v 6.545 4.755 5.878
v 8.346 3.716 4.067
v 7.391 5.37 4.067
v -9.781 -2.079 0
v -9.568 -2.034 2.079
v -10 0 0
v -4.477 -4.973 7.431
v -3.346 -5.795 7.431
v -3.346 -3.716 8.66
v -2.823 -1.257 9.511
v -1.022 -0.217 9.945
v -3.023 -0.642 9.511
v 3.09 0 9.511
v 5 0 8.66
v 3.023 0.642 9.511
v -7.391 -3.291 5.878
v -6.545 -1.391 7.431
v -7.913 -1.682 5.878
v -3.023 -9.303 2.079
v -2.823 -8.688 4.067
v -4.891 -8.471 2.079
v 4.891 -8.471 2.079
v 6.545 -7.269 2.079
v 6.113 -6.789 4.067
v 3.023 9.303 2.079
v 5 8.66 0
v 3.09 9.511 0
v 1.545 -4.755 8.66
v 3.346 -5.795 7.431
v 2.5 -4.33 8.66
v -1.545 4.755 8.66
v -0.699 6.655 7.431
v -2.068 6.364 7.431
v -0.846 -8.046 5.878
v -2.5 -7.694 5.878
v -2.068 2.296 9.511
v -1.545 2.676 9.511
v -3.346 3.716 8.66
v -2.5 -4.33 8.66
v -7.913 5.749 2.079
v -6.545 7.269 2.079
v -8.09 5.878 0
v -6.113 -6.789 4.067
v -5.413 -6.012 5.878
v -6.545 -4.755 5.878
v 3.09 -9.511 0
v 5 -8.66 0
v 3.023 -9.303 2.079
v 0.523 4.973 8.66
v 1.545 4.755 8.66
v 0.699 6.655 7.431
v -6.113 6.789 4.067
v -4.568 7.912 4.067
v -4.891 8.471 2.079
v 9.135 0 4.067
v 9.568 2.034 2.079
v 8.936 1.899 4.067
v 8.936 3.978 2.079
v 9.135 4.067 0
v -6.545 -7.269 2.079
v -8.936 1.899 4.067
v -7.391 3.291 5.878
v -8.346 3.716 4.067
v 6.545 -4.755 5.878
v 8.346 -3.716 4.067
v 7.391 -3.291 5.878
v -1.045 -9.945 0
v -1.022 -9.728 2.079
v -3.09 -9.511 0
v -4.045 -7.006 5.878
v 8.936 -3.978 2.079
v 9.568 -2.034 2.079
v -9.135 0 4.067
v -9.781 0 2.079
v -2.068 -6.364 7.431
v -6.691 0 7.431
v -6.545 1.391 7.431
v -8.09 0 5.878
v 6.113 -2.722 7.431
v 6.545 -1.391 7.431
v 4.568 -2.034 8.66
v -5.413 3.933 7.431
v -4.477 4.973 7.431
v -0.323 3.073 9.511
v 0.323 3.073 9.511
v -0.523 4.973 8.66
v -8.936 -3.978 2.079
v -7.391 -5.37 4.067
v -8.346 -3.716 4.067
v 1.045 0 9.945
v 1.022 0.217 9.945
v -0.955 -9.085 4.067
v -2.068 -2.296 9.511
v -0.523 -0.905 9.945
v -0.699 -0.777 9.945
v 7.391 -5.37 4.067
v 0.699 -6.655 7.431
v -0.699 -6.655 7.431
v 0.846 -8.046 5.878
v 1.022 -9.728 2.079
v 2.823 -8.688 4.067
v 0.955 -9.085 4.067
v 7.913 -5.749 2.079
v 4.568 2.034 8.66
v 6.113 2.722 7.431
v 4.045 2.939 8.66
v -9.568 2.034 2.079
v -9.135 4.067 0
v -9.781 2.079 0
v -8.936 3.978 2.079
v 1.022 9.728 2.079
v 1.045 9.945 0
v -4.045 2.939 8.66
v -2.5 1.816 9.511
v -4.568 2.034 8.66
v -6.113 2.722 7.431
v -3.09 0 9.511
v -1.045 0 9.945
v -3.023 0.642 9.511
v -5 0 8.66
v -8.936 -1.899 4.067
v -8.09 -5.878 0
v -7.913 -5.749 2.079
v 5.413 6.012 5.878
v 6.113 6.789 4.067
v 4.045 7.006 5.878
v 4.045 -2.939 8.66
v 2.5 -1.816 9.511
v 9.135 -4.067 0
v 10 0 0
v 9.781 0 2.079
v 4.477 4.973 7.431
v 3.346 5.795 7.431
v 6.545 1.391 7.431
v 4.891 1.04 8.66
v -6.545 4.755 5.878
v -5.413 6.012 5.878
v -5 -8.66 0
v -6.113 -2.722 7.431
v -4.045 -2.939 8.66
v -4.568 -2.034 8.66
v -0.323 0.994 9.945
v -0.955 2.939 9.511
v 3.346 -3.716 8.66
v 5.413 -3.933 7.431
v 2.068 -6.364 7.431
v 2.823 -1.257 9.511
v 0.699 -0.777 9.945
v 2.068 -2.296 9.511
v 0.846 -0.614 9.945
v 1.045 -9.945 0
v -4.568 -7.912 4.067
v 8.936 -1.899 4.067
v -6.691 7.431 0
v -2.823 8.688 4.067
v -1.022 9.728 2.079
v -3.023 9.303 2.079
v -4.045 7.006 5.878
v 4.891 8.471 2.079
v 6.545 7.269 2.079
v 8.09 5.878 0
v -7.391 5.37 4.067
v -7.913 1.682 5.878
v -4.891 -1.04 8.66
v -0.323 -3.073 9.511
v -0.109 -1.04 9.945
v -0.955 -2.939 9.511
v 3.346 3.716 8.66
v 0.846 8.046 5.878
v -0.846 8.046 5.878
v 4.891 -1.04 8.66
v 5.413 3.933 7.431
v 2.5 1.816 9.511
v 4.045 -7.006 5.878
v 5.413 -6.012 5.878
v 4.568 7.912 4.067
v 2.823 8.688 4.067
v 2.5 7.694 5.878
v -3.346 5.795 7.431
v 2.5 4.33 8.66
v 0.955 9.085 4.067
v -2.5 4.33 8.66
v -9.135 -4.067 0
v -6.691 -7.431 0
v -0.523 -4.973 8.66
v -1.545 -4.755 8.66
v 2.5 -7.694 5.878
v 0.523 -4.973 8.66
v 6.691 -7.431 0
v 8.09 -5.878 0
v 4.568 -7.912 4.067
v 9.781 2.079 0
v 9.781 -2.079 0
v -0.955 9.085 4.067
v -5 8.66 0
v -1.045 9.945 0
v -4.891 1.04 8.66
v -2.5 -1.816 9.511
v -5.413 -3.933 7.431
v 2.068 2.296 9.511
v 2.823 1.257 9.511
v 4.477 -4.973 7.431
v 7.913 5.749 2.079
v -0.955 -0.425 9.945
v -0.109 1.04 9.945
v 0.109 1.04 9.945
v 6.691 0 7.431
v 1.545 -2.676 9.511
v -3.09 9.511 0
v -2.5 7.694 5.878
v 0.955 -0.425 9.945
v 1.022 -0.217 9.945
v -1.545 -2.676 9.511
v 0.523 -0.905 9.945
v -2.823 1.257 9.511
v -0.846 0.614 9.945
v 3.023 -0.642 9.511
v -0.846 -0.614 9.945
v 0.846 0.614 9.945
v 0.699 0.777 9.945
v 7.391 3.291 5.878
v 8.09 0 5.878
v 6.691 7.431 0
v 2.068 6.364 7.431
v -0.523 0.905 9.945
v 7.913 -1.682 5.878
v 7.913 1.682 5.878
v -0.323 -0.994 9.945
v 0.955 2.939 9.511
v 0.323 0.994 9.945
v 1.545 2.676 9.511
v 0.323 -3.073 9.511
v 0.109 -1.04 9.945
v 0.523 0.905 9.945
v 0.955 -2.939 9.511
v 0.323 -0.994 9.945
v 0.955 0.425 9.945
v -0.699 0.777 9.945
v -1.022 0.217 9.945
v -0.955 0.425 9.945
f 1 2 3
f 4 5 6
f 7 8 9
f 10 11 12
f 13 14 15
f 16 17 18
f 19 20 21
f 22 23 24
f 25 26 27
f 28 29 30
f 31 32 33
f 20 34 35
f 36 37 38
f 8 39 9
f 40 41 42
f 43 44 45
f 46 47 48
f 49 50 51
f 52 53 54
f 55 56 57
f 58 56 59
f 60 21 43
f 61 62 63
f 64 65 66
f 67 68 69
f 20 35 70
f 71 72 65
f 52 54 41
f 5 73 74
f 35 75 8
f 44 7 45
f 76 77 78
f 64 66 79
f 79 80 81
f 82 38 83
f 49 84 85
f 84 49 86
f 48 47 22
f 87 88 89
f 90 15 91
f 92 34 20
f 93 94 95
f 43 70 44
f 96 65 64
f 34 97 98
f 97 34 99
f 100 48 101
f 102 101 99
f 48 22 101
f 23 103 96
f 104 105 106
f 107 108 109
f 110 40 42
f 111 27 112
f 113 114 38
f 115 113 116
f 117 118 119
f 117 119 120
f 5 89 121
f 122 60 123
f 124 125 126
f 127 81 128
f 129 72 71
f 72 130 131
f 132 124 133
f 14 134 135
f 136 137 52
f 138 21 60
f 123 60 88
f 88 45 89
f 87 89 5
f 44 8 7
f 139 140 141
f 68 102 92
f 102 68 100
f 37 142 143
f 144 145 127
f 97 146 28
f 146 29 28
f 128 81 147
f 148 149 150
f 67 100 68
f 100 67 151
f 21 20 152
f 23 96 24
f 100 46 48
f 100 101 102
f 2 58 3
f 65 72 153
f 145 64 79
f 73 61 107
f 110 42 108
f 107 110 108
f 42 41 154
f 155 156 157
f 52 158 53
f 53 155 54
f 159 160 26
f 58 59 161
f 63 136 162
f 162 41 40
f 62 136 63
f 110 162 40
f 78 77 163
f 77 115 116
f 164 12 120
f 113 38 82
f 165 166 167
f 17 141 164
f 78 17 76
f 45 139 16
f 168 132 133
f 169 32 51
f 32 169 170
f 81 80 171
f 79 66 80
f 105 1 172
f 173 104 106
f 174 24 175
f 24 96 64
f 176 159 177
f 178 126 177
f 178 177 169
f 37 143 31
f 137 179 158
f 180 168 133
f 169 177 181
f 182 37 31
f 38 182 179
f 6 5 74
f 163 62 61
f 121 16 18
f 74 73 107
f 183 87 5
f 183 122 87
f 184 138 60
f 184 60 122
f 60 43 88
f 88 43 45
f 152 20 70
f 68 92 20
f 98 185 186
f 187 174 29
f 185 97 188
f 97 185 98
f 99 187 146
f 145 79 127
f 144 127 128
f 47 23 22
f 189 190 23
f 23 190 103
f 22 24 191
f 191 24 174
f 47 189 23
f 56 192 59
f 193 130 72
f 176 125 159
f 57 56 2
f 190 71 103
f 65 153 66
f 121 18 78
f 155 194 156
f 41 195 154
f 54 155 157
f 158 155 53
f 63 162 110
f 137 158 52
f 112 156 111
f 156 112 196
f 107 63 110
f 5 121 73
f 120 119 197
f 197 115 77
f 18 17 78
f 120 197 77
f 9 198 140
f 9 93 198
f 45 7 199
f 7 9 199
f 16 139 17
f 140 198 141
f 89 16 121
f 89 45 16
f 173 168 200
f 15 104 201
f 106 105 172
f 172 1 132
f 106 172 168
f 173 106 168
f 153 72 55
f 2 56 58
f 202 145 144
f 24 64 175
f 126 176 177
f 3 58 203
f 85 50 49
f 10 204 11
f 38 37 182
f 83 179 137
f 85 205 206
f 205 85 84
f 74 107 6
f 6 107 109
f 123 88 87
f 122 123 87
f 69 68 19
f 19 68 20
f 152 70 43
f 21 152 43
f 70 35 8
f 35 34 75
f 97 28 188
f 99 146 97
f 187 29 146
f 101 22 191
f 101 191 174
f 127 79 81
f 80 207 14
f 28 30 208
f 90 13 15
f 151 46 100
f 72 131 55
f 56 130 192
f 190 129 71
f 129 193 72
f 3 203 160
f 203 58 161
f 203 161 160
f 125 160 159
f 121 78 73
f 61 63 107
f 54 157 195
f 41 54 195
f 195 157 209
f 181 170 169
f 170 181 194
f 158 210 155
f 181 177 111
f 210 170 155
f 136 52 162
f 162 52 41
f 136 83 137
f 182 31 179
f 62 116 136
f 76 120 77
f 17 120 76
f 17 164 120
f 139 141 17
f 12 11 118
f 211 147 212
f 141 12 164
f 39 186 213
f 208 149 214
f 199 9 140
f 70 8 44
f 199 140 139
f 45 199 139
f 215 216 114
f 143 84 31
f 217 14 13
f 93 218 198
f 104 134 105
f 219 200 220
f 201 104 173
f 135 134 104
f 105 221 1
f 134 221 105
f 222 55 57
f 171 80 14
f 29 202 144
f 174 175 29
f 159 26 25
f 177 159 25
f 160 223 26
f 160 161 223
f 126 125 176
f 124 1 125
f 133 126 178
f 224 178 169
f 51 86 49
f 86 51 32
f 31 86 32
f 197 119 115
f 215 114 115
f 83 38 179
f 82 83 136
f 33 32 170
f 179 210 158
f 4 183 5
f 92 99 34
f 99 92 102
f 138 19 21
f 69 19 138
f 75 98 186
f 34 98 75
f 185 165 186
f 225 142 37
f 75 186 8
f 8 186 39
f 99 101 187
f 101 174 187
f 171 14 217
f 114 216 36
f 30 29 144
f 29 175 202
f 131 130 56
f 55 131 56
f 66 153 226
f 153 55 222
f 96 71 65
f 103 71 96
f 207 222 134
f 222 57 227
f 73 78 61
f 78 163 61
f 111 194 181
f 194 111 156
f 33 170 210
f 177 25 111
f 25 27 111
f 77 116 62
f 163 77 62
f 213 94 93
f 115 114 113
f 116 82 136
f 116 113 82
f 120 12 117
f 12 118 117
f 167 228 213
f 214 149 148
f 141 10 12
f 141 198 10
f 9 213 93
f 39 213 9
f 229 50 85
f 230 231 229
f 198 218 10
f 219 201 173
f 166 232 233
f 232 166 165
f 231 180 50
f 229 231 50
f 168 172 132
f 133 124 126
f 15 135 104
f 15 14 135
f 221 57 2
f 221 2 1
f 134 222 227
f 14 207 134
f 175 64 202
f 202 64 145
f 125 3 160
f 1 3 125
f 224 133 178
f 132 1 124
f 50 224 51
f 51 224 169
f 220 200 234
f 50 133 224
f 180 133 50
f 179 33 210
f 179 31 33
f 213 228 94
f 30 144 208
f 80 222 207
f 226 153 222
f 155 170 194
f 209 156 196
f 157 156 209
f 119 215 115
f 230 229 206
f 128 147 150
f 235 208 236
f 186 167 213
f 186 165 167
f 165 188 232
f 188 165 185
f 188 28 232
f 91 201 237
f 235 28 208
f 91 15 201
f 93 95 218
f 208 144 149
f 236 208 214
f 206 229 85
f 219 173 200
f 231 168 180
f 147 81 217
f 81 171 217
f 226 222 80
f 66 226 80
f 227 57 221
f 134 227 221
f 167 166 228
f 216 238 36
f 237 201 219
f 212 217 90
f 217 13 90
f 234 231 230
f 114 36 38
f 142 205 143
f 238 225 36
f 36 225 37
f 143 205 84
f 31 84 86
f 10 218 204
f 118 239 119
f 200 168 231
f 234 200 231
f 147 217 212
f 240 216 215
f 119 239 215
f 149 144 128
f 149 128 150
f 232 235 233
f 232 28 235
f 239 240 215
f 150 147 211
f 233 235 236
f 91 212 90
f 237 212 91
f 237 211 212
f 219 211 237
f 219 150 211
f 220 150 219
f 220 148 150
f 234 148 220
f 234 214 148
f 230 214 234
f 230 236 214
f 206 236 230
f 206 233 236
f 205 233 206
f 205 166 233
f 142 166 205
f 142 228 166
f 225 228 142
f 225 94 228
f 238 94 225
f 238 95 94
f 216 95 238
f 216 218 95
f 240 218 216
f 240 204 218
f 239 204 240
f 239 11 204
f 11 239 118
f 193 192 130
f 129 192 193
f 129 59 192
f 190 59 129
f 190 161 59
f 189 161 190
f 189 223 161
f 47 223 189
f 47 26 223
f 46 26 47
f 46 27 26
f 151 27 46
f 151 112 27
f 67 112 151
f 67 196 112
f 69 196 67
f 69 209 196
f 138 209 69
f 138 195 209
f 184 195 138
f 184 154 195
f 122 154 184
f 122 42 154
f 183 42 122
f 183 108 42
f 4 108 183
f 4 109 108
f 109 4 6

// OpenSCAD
// file: vars.scad
height=25;
diameter=178;
recess_height=10;
recess_outer_diameter=170;
recess_inner_diameter=155;

// how high the feet should be
feet_size=recess_height;
// main file
include <vars.scad>;

// rotate is so it one does not need to flip it when importing the generated STL
rotate([0,180,0]){
    difference(){
        // size is doubled here so the value for feet_size is the actual height
        sphere(d=feet_size*2);
        translate([-feet_size,-feet_size,0]){
            cube(size=feet_size*2);
        };
    };
};
